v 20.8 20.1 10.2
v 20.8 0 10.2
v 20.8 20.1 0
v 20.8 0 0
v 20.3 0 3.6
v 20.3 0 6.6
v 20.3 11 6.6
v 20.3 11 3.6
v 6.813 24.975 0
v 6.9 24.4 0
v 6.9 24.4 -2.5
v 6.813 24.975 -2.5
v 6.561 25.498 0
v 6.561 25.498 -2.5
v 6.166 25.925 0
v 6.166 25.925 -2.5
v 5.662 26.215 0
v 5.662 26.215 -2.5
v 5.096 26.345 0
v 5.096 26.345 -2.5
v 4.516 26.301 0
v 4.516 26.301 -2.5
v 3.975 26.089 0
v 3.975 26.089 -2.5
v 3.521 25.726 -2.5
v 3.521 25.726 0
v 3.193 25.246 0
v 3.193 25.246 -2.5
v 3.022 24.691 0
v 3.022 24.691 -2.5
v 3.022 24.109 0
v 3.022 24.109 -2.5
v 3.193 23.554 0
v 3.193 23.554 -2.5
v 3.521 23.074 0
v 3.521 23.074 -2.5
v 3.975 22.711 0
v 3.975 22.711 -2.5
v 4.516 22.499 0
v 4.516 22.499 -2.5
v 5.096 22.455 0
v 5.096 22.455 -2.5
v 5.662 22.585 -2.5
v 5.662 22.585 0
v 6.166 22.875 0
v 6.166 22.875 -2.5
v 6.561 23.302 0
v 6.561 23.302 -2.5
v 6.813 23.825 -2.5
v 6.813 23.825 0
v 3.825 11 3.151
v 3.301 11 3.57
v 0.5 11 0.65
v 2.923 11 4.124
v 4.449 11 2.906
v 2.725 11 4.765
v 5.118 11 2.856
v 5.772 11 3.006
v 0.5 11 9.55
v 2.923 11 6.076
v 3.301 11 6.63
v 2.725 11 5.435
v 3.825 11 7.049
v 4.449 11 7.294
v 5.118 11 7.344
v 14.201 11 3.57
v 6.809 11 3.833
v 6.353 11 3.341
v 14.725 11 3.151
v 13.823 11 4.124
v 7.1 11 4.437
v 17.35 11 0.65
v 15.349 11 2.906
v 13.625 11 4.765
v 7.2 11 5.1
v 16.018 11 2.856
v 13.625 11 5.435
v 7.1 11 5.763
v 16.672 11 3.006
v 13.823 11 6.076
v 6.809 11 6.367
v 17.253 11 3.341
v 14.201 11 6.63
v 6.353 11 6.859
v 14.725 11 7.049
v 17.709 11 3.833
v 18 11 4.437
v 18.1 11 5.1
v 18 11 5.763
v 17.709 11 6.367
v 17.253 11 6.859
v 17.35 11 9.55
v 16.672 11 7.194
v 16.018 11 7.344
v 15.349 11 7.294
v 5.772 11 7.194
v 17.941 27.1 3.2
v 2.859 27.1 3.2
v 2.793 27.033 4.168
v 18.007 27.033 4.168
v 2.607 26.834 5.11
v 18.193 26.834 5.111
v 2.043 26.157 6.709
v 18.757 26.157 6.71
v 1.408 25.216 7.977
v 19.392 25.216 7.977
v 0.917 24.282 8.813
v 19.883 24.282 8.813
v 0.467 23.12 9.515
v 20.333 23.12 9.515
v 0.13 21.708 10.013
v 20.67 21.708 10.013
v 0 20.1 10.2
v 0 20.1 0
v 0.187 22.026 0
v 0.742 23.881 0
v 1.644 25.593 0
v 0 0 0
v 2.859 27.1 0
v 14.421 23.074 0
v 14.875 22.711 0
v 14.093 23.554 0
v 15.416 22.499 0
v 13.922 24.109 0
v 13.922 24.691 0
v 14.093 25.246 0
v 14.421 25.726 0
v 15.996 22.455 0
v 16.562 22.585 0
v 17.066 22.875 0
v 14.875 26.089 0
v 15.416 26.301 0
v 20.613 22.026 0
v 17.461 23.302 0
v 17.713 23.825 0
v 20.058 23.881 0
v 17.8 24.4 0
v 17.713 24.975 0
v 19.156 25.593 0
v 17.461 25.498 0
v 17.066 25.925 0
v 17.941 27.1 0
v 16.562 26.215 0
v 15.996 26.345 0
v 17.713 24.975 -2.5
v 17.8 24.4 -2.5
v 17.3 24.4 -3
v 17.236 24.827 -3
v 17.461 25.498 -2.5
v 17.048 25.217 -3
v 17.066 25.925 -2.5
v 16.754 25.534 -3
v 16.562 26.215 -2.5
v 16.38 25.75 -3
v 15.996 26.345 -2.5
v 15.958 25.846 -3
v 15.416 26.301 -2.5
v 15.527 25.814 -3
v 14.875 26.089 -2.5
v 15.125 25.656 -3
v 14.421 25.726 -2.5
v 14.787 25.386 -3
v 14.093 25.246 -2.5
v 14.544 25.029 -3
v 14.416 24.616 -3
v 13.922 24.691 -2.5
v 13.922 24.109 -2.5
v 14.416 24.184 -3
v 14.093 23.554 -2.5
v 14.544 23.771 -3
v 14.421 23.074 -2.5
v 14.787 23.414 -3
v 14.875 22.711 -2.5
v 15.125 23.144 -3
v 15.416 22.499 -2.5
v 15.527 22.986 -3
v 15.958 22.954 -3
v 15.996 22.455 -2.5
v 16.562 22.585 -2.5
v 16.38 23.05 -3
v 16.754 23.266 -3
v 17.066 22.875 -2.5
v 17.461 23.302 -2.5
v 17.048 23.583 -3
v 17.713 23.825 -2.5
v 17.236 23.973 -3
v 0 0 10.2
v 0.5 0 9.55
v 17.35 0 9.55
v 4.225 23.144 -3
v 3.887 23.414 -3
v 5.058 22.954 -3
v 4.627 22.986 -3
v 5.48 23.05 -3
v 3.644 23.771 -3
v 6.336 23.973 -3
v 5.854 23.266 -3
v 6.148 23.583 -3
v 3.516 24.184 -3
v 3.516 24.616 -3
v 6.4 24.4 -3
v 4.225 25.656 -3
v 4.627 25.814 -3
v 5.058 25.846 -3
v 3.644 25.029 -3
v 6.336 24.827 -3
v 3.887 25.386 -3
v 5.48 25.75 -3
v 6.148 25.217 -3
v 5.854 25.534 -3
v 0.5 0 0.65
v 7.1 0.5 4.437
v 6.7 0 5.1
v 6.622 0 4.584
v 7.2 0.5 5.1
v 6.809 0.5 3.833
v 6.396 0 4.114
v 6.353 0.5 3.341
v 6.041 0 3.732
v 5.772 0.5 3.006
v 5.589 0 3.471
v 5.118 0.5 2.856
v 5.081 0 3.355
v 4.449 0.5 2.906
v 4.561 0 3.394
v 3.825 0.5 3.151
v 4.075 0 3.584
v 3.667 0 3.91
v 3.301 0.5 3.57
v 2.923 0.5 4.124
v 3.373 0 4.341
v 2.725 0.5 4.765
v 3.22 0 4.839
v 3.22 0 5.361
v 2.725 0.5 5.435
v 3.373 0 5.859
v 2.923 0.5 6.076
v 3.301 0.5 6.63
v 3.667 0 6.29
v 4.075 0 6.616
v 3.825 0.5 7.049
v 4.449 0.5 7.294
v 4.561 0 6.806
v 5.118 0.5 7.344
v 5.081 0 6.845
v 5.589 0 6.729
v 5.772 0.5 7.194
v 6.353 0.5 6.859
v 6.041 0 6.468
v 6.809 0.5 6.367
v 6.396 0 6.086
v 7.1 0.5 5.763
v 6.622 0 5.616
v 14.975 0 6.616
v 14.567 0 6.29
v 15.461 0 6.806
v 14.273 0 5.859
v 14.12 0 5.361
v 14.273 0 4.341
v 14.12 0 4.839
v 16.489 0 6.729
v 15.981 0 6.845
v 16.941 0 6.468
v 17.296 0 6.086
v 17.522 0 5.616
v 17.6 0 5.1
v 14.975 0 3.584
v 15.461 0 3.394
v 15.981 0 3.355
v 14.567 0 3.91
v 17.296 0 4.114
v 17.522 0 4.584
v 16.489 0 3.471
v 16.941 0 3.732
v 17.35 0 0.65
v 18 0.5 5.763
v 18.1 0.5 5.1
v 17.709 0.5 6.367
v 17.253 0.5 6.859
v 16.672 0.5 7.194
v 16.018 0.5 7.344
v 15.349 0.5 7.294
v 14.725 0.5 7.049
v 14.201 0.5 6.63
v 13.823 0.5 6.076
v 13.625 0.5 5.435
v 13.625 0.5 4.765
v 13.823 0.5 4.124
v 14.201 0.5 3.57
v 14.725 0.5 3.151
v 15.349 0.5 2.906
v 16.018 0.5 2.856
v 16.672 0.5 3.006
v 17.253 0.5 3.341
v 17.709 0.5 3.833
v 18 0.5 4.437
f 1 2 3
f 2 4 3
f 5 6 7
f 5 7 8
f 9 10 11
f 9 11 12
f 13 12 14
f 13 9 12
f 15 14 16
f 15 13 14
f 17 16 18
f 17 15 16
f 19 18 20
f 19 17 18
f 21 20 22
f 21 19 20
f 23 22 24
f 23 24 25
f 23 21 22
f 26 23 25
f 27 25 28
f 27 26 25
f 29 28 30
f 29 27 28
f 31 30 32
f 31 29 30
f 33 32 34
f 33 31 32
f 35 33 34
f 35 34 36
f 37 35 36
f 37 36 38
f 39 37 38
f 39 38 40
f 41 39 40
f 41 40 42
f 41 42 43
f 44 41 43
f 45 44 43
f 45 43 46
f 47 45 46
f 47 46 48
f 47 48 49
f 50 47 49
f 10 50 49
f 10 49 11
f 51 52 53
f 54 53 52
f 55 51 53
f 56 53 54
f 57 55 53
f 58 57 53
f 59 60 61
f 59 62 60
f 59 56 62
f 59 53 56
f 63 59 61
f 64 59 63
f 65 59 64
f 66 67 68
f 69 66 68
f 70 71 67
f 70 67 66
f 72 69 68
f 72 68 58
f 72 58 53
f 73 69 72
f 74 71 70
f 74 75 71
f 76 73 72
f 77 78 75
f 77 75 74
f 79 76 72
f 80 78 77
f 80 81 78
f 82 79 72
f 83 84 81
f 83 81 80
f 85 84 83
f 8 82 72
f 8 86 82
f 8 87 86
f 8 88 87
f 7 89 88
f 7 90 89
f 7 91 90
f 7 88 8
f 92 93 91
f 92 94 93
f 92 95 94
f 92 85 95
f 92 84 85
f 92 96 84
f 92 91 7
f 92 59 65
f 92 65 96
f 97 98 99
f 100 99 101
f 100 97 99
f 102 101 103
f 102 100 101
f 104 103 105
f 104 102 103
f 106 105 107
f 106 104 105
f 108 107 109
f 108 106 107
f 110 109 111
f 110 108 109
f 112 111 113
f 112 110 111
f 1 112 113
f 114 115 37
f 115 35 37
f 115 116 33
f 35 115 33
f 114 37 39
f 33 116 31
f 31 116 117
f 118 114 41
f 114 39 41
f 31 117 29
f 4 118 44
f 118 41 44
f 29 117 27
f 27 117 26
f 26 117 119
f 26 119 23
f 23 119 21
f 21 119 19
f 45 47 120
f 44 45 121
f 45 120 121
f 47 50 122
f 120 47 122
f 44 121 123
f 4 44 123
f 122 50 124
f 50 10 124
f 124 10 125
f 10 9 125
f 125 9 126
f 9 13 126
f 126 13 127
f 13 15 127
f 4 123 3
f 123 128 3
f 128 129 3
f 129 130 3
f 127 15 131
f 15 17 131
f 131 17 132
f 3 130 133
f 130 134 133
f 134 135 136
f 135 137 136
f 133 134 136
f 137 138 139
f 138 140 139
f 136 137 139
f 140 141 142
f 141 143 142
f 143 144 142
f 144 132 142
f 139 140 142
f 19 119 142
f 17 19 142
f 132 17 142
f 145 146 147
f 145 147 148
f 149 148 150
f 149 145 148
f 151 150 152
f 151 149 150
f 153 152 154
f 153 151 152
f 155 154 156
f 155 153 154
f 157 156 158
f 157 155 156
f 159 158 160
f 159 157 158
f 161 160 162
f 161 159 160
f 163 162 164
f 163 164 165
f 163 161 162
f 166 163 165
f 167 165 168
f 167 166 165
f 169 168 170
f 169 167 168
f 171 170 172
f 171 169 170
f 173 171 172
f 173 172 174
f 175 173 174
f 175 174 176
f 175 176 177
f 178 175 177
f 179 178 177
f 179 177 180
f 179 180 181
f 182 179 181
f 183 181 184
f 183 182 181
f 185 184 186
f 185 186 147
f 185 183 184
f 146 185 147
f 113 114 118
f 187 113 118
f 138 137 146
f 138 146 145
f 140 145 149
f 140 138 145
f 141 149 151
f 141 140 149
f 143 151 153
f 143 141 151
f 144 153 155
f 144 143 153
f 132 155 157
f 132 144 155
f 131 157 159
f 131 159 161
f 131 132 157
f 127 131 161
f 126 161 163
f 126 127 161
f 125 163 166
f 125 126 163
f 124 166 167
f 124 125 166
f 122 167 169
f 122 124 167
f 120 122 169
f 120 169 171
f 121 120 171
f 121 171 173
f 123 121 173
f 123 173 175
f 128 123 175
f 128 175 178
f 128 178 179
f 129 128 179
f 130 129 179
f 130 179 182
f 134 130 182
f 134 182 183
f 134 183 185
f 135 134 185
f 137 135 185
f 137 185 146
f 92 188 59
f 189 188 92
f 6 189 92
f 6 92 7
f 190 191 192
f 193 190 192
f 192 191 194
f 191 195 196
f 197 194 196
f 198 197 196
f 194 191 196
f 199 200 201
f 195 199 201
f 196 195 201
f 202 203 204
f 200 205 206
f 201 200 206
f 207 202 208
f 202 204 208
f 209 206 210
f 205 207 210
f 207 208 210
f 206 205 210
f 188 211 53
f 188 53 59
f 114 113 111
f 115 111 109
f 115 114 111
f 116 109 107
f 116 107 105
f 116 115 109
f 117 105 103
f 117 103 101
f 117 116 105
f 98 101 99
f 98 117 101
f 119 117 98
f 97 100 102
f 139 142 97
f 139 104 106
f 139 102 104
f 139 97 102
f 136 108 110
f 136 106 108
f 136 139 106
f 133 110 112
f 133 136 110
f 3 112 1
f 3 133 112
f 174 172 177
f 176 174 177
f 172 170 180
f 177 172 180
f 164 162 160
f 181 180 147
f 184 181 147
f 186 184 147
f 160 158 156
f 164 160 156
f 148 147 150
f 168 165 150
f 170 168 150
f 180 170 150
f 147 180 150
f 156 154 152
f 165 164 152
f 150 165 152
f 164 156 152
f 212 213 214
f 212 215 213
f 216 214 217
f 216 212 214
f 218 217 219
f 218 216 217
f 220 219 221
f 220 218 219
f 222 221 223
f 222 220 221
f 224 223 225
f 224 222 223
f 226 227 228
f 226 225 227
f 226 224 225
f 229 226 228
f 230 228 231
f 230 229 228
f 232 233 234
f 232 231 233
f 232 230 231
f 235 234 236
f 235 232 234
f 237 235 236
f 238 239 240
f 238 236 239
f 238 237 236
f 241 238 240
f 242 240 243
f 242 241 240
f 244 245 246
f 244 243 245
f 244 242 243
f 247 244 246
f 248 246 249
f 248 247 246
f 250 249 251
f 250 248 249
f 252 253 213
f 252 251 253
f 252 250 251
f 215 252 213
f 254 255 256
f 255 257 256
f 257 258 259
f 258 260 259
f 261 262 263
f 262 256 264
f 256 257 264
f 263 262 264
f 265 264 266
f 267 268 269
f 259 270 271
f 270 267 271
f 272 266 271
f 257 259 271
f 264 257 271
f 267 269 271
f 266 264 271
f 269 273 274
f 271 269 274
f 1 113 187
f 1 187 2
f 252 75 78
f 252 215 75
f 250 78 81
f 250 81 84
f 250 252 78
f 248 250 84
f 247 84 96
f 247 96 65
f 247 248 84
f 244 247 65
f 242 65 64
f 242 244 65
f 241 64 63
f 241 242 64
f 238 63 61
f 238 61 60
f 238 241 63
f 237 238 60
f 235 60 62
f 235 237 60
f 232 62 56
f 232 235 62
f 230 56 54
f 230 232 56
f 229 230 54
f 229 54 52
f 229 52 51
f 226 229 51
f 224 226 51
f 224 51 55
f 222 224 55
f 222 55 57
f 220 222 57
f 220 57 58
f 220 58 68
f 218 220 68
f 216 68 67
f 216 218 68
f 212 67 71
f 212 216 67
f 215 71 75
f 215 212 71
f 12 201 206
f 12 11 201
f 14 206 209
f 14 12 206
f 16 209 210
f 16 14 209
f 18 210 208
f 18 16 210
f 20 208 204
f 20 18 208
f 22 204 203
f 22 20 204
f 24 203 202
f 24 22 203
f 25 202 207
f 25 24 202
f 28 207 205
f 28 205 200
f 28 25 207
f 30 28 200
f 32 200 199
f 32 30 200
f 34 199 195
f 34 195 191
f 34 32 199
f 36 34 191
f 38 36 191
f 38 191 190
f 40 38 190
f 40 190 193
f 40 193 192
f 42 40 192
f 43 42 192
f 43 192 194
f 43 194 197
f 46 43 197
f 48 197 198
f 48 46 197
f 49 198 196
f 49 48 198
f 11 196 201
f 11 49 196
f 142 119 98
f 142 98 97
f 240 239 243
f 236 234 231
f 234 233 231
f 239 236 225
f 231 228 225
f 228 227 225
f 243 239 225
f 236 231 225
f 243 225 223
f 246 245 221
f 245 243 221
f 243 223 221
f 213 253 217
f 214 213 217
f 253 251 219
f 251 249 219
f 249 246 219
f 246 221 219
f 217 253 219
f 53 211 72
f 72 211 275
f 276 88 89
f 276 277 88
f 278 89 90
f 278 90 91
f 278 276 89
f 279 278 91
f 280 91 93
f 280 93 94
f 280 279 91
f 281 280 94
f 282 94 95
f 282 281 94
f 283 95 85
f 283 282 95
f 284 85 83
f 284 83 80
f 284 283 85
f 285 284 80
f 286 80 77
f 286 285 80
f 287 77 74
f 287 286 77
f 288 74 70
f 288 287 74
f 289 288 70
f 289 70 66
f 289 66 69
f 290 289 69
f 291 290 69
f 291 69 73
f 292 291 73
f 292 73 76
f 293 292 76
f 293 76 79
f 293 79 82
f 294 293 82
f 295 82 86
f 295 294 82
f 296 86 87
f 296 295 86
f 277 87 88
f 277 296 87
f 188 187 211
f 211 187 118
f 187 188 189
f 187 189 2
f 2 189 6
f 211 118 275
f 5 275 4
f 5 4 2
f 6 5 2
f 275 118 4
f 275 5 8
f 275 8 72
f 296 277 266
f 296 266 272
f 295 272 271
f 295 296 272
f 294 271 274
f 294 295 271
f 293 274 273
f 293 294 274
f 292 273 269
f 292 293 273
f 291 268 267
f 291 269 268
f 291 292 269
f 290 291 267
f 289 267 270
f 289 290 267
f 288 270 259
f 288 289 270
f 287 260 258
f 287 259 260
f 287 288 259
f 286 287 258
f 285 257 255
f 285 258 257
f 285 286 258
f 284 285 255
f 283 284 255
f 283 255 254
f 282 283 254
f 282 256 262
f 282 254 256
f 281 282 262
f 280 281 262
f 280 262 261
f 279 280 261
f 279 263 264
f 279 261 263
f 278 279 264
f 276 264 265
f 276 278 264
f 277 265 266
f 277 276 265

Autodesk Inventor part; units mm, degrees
ref_plane "YZ Plane" through (0, 0, 0) normal (1, 0, 0) x (0, 1, 0)
ref_plane "XZ Plane" through (0, 0, 0) normal (0, 1, 0) x (-1, 0, 0)
ref_plane "XY Plane" through (0, 0, 0) normal (0, 0, 1) x (1, 0, 0)
sketch "Skizze1" plane through (0, 0, 0) normal (0, 0, 1) x (1, 0, 0)
  line L0 (0, 0) -> (20.8, 0)
  line L1 (20.8, 0) -> (20.8, 20.1)
  line L2 (20.8, 20.1) -> (0, 20.1)
  line L3 (0, 20.1) -> (0, 0)
  arc A0 (2.8586, 27.1) -> (0, 20.1) centre (10, 20.1) ccw
  line L4 (2.8586, 27.1) -> (17.9414, 27.1)
  arc A1 (20.8, 20.1) -> (17.9414, 27.1) centre (10.8, 20.1) ccw
  circle A2 centre (4.95, 24.4) radius 1.95
  circle A3 centre (15.85, 24.4) radius 1.95
  line L5 (4.95, 26.35) -> (15.85, 26.35) construction
  point P0 (10.4, 27.1)
  dimension "d4" = 3.9
  dimension "d0" = 27.1
  dimension "d1" = 20.8
  dimension "d2" = 7
  dimension "d3" = 10
  dimension "d5" = 10.9
  dimension "d6" = 5.45
  dimension "d7" = 26.35
extrude "Extrusion1" add sketch "Skizze1" along normal blind 10.2 contours L3 L2 L1 L0 | A0 L4 A1 L2 | A2 | A3
extrude "Extrusion2" add sketch "Skizze1" against normal blind 3 contours A2 | A3
fillet "Rundung1" radius 7 1 edges at (10.4, 27.1, 10.2)
chamfer "Fase1" distance 0.5 angle 45 2 edges at (13.9, 24.4, -3) (3, 24.4, -3)
sketch "Skizze2" plane through (0, 0, 0) normal (0, -1, 0) x (1, 0, 0)
  line L0 (0.5, 0.65) -> (0.5, 9.55)
  line L1 (0.5, 9.55) -> (17.35, 9.55)
  line L2 (17.35, 9.55) -> (20.3, 6.6)
  line L3 (20.3, 6.6) -> (20.3, 3.6)
  line L4 (20.3, 3.6) -> (17.35, 0.65)
  line L5 (0.5, 0.65) -> (17.35, 0.65)
  line L6 (0, 0) -> (0, 10.2) projected
  circle A0 centre (4.95, 5.1) radius 2.85
  circle A1 centre (4.95, 5.1) radius 2.25
  circle A2 centre (15.85, 5.1) radius 2.85
  circle A3 centre (15.85, 5.1) radius 2.25
  line L7 (0, 10.2) -> (20.8, 10.2) projected
  point P0 (0.5, 5.1)
  point P1 (0, 5.1)
  point P2 (20.3, 5.1)
  point P3 (10.4, 10.2)
  dimension "d16" = 19.8
  dimension "d17" = 8.9
  dimension "d18" = 0.5
  dimension "d19" = 3
  dimension "d20" = 45
  dimension "d21" = 5.7
  dimension "d22" = 4.5
  dimension "d23" = 10.9
  dimension "d24" = 5.45
extrude "Extrusion3" cut sketch "Skizze2" against normal blind 11 contours L0 L1 L2 L3 L4 L5 | A0 | A2
chamfer "Fase2" distance 0.5 angle 45 2 edges at (2.7, 0, 5.1) (13.6, 0, 5.1)
equation "\"d6\" = 0.5 * d5"
equation "\"d24\" = 0.5 * d23"
properties part number "XT90PW" material "PC/ABS-Kunststoff"
